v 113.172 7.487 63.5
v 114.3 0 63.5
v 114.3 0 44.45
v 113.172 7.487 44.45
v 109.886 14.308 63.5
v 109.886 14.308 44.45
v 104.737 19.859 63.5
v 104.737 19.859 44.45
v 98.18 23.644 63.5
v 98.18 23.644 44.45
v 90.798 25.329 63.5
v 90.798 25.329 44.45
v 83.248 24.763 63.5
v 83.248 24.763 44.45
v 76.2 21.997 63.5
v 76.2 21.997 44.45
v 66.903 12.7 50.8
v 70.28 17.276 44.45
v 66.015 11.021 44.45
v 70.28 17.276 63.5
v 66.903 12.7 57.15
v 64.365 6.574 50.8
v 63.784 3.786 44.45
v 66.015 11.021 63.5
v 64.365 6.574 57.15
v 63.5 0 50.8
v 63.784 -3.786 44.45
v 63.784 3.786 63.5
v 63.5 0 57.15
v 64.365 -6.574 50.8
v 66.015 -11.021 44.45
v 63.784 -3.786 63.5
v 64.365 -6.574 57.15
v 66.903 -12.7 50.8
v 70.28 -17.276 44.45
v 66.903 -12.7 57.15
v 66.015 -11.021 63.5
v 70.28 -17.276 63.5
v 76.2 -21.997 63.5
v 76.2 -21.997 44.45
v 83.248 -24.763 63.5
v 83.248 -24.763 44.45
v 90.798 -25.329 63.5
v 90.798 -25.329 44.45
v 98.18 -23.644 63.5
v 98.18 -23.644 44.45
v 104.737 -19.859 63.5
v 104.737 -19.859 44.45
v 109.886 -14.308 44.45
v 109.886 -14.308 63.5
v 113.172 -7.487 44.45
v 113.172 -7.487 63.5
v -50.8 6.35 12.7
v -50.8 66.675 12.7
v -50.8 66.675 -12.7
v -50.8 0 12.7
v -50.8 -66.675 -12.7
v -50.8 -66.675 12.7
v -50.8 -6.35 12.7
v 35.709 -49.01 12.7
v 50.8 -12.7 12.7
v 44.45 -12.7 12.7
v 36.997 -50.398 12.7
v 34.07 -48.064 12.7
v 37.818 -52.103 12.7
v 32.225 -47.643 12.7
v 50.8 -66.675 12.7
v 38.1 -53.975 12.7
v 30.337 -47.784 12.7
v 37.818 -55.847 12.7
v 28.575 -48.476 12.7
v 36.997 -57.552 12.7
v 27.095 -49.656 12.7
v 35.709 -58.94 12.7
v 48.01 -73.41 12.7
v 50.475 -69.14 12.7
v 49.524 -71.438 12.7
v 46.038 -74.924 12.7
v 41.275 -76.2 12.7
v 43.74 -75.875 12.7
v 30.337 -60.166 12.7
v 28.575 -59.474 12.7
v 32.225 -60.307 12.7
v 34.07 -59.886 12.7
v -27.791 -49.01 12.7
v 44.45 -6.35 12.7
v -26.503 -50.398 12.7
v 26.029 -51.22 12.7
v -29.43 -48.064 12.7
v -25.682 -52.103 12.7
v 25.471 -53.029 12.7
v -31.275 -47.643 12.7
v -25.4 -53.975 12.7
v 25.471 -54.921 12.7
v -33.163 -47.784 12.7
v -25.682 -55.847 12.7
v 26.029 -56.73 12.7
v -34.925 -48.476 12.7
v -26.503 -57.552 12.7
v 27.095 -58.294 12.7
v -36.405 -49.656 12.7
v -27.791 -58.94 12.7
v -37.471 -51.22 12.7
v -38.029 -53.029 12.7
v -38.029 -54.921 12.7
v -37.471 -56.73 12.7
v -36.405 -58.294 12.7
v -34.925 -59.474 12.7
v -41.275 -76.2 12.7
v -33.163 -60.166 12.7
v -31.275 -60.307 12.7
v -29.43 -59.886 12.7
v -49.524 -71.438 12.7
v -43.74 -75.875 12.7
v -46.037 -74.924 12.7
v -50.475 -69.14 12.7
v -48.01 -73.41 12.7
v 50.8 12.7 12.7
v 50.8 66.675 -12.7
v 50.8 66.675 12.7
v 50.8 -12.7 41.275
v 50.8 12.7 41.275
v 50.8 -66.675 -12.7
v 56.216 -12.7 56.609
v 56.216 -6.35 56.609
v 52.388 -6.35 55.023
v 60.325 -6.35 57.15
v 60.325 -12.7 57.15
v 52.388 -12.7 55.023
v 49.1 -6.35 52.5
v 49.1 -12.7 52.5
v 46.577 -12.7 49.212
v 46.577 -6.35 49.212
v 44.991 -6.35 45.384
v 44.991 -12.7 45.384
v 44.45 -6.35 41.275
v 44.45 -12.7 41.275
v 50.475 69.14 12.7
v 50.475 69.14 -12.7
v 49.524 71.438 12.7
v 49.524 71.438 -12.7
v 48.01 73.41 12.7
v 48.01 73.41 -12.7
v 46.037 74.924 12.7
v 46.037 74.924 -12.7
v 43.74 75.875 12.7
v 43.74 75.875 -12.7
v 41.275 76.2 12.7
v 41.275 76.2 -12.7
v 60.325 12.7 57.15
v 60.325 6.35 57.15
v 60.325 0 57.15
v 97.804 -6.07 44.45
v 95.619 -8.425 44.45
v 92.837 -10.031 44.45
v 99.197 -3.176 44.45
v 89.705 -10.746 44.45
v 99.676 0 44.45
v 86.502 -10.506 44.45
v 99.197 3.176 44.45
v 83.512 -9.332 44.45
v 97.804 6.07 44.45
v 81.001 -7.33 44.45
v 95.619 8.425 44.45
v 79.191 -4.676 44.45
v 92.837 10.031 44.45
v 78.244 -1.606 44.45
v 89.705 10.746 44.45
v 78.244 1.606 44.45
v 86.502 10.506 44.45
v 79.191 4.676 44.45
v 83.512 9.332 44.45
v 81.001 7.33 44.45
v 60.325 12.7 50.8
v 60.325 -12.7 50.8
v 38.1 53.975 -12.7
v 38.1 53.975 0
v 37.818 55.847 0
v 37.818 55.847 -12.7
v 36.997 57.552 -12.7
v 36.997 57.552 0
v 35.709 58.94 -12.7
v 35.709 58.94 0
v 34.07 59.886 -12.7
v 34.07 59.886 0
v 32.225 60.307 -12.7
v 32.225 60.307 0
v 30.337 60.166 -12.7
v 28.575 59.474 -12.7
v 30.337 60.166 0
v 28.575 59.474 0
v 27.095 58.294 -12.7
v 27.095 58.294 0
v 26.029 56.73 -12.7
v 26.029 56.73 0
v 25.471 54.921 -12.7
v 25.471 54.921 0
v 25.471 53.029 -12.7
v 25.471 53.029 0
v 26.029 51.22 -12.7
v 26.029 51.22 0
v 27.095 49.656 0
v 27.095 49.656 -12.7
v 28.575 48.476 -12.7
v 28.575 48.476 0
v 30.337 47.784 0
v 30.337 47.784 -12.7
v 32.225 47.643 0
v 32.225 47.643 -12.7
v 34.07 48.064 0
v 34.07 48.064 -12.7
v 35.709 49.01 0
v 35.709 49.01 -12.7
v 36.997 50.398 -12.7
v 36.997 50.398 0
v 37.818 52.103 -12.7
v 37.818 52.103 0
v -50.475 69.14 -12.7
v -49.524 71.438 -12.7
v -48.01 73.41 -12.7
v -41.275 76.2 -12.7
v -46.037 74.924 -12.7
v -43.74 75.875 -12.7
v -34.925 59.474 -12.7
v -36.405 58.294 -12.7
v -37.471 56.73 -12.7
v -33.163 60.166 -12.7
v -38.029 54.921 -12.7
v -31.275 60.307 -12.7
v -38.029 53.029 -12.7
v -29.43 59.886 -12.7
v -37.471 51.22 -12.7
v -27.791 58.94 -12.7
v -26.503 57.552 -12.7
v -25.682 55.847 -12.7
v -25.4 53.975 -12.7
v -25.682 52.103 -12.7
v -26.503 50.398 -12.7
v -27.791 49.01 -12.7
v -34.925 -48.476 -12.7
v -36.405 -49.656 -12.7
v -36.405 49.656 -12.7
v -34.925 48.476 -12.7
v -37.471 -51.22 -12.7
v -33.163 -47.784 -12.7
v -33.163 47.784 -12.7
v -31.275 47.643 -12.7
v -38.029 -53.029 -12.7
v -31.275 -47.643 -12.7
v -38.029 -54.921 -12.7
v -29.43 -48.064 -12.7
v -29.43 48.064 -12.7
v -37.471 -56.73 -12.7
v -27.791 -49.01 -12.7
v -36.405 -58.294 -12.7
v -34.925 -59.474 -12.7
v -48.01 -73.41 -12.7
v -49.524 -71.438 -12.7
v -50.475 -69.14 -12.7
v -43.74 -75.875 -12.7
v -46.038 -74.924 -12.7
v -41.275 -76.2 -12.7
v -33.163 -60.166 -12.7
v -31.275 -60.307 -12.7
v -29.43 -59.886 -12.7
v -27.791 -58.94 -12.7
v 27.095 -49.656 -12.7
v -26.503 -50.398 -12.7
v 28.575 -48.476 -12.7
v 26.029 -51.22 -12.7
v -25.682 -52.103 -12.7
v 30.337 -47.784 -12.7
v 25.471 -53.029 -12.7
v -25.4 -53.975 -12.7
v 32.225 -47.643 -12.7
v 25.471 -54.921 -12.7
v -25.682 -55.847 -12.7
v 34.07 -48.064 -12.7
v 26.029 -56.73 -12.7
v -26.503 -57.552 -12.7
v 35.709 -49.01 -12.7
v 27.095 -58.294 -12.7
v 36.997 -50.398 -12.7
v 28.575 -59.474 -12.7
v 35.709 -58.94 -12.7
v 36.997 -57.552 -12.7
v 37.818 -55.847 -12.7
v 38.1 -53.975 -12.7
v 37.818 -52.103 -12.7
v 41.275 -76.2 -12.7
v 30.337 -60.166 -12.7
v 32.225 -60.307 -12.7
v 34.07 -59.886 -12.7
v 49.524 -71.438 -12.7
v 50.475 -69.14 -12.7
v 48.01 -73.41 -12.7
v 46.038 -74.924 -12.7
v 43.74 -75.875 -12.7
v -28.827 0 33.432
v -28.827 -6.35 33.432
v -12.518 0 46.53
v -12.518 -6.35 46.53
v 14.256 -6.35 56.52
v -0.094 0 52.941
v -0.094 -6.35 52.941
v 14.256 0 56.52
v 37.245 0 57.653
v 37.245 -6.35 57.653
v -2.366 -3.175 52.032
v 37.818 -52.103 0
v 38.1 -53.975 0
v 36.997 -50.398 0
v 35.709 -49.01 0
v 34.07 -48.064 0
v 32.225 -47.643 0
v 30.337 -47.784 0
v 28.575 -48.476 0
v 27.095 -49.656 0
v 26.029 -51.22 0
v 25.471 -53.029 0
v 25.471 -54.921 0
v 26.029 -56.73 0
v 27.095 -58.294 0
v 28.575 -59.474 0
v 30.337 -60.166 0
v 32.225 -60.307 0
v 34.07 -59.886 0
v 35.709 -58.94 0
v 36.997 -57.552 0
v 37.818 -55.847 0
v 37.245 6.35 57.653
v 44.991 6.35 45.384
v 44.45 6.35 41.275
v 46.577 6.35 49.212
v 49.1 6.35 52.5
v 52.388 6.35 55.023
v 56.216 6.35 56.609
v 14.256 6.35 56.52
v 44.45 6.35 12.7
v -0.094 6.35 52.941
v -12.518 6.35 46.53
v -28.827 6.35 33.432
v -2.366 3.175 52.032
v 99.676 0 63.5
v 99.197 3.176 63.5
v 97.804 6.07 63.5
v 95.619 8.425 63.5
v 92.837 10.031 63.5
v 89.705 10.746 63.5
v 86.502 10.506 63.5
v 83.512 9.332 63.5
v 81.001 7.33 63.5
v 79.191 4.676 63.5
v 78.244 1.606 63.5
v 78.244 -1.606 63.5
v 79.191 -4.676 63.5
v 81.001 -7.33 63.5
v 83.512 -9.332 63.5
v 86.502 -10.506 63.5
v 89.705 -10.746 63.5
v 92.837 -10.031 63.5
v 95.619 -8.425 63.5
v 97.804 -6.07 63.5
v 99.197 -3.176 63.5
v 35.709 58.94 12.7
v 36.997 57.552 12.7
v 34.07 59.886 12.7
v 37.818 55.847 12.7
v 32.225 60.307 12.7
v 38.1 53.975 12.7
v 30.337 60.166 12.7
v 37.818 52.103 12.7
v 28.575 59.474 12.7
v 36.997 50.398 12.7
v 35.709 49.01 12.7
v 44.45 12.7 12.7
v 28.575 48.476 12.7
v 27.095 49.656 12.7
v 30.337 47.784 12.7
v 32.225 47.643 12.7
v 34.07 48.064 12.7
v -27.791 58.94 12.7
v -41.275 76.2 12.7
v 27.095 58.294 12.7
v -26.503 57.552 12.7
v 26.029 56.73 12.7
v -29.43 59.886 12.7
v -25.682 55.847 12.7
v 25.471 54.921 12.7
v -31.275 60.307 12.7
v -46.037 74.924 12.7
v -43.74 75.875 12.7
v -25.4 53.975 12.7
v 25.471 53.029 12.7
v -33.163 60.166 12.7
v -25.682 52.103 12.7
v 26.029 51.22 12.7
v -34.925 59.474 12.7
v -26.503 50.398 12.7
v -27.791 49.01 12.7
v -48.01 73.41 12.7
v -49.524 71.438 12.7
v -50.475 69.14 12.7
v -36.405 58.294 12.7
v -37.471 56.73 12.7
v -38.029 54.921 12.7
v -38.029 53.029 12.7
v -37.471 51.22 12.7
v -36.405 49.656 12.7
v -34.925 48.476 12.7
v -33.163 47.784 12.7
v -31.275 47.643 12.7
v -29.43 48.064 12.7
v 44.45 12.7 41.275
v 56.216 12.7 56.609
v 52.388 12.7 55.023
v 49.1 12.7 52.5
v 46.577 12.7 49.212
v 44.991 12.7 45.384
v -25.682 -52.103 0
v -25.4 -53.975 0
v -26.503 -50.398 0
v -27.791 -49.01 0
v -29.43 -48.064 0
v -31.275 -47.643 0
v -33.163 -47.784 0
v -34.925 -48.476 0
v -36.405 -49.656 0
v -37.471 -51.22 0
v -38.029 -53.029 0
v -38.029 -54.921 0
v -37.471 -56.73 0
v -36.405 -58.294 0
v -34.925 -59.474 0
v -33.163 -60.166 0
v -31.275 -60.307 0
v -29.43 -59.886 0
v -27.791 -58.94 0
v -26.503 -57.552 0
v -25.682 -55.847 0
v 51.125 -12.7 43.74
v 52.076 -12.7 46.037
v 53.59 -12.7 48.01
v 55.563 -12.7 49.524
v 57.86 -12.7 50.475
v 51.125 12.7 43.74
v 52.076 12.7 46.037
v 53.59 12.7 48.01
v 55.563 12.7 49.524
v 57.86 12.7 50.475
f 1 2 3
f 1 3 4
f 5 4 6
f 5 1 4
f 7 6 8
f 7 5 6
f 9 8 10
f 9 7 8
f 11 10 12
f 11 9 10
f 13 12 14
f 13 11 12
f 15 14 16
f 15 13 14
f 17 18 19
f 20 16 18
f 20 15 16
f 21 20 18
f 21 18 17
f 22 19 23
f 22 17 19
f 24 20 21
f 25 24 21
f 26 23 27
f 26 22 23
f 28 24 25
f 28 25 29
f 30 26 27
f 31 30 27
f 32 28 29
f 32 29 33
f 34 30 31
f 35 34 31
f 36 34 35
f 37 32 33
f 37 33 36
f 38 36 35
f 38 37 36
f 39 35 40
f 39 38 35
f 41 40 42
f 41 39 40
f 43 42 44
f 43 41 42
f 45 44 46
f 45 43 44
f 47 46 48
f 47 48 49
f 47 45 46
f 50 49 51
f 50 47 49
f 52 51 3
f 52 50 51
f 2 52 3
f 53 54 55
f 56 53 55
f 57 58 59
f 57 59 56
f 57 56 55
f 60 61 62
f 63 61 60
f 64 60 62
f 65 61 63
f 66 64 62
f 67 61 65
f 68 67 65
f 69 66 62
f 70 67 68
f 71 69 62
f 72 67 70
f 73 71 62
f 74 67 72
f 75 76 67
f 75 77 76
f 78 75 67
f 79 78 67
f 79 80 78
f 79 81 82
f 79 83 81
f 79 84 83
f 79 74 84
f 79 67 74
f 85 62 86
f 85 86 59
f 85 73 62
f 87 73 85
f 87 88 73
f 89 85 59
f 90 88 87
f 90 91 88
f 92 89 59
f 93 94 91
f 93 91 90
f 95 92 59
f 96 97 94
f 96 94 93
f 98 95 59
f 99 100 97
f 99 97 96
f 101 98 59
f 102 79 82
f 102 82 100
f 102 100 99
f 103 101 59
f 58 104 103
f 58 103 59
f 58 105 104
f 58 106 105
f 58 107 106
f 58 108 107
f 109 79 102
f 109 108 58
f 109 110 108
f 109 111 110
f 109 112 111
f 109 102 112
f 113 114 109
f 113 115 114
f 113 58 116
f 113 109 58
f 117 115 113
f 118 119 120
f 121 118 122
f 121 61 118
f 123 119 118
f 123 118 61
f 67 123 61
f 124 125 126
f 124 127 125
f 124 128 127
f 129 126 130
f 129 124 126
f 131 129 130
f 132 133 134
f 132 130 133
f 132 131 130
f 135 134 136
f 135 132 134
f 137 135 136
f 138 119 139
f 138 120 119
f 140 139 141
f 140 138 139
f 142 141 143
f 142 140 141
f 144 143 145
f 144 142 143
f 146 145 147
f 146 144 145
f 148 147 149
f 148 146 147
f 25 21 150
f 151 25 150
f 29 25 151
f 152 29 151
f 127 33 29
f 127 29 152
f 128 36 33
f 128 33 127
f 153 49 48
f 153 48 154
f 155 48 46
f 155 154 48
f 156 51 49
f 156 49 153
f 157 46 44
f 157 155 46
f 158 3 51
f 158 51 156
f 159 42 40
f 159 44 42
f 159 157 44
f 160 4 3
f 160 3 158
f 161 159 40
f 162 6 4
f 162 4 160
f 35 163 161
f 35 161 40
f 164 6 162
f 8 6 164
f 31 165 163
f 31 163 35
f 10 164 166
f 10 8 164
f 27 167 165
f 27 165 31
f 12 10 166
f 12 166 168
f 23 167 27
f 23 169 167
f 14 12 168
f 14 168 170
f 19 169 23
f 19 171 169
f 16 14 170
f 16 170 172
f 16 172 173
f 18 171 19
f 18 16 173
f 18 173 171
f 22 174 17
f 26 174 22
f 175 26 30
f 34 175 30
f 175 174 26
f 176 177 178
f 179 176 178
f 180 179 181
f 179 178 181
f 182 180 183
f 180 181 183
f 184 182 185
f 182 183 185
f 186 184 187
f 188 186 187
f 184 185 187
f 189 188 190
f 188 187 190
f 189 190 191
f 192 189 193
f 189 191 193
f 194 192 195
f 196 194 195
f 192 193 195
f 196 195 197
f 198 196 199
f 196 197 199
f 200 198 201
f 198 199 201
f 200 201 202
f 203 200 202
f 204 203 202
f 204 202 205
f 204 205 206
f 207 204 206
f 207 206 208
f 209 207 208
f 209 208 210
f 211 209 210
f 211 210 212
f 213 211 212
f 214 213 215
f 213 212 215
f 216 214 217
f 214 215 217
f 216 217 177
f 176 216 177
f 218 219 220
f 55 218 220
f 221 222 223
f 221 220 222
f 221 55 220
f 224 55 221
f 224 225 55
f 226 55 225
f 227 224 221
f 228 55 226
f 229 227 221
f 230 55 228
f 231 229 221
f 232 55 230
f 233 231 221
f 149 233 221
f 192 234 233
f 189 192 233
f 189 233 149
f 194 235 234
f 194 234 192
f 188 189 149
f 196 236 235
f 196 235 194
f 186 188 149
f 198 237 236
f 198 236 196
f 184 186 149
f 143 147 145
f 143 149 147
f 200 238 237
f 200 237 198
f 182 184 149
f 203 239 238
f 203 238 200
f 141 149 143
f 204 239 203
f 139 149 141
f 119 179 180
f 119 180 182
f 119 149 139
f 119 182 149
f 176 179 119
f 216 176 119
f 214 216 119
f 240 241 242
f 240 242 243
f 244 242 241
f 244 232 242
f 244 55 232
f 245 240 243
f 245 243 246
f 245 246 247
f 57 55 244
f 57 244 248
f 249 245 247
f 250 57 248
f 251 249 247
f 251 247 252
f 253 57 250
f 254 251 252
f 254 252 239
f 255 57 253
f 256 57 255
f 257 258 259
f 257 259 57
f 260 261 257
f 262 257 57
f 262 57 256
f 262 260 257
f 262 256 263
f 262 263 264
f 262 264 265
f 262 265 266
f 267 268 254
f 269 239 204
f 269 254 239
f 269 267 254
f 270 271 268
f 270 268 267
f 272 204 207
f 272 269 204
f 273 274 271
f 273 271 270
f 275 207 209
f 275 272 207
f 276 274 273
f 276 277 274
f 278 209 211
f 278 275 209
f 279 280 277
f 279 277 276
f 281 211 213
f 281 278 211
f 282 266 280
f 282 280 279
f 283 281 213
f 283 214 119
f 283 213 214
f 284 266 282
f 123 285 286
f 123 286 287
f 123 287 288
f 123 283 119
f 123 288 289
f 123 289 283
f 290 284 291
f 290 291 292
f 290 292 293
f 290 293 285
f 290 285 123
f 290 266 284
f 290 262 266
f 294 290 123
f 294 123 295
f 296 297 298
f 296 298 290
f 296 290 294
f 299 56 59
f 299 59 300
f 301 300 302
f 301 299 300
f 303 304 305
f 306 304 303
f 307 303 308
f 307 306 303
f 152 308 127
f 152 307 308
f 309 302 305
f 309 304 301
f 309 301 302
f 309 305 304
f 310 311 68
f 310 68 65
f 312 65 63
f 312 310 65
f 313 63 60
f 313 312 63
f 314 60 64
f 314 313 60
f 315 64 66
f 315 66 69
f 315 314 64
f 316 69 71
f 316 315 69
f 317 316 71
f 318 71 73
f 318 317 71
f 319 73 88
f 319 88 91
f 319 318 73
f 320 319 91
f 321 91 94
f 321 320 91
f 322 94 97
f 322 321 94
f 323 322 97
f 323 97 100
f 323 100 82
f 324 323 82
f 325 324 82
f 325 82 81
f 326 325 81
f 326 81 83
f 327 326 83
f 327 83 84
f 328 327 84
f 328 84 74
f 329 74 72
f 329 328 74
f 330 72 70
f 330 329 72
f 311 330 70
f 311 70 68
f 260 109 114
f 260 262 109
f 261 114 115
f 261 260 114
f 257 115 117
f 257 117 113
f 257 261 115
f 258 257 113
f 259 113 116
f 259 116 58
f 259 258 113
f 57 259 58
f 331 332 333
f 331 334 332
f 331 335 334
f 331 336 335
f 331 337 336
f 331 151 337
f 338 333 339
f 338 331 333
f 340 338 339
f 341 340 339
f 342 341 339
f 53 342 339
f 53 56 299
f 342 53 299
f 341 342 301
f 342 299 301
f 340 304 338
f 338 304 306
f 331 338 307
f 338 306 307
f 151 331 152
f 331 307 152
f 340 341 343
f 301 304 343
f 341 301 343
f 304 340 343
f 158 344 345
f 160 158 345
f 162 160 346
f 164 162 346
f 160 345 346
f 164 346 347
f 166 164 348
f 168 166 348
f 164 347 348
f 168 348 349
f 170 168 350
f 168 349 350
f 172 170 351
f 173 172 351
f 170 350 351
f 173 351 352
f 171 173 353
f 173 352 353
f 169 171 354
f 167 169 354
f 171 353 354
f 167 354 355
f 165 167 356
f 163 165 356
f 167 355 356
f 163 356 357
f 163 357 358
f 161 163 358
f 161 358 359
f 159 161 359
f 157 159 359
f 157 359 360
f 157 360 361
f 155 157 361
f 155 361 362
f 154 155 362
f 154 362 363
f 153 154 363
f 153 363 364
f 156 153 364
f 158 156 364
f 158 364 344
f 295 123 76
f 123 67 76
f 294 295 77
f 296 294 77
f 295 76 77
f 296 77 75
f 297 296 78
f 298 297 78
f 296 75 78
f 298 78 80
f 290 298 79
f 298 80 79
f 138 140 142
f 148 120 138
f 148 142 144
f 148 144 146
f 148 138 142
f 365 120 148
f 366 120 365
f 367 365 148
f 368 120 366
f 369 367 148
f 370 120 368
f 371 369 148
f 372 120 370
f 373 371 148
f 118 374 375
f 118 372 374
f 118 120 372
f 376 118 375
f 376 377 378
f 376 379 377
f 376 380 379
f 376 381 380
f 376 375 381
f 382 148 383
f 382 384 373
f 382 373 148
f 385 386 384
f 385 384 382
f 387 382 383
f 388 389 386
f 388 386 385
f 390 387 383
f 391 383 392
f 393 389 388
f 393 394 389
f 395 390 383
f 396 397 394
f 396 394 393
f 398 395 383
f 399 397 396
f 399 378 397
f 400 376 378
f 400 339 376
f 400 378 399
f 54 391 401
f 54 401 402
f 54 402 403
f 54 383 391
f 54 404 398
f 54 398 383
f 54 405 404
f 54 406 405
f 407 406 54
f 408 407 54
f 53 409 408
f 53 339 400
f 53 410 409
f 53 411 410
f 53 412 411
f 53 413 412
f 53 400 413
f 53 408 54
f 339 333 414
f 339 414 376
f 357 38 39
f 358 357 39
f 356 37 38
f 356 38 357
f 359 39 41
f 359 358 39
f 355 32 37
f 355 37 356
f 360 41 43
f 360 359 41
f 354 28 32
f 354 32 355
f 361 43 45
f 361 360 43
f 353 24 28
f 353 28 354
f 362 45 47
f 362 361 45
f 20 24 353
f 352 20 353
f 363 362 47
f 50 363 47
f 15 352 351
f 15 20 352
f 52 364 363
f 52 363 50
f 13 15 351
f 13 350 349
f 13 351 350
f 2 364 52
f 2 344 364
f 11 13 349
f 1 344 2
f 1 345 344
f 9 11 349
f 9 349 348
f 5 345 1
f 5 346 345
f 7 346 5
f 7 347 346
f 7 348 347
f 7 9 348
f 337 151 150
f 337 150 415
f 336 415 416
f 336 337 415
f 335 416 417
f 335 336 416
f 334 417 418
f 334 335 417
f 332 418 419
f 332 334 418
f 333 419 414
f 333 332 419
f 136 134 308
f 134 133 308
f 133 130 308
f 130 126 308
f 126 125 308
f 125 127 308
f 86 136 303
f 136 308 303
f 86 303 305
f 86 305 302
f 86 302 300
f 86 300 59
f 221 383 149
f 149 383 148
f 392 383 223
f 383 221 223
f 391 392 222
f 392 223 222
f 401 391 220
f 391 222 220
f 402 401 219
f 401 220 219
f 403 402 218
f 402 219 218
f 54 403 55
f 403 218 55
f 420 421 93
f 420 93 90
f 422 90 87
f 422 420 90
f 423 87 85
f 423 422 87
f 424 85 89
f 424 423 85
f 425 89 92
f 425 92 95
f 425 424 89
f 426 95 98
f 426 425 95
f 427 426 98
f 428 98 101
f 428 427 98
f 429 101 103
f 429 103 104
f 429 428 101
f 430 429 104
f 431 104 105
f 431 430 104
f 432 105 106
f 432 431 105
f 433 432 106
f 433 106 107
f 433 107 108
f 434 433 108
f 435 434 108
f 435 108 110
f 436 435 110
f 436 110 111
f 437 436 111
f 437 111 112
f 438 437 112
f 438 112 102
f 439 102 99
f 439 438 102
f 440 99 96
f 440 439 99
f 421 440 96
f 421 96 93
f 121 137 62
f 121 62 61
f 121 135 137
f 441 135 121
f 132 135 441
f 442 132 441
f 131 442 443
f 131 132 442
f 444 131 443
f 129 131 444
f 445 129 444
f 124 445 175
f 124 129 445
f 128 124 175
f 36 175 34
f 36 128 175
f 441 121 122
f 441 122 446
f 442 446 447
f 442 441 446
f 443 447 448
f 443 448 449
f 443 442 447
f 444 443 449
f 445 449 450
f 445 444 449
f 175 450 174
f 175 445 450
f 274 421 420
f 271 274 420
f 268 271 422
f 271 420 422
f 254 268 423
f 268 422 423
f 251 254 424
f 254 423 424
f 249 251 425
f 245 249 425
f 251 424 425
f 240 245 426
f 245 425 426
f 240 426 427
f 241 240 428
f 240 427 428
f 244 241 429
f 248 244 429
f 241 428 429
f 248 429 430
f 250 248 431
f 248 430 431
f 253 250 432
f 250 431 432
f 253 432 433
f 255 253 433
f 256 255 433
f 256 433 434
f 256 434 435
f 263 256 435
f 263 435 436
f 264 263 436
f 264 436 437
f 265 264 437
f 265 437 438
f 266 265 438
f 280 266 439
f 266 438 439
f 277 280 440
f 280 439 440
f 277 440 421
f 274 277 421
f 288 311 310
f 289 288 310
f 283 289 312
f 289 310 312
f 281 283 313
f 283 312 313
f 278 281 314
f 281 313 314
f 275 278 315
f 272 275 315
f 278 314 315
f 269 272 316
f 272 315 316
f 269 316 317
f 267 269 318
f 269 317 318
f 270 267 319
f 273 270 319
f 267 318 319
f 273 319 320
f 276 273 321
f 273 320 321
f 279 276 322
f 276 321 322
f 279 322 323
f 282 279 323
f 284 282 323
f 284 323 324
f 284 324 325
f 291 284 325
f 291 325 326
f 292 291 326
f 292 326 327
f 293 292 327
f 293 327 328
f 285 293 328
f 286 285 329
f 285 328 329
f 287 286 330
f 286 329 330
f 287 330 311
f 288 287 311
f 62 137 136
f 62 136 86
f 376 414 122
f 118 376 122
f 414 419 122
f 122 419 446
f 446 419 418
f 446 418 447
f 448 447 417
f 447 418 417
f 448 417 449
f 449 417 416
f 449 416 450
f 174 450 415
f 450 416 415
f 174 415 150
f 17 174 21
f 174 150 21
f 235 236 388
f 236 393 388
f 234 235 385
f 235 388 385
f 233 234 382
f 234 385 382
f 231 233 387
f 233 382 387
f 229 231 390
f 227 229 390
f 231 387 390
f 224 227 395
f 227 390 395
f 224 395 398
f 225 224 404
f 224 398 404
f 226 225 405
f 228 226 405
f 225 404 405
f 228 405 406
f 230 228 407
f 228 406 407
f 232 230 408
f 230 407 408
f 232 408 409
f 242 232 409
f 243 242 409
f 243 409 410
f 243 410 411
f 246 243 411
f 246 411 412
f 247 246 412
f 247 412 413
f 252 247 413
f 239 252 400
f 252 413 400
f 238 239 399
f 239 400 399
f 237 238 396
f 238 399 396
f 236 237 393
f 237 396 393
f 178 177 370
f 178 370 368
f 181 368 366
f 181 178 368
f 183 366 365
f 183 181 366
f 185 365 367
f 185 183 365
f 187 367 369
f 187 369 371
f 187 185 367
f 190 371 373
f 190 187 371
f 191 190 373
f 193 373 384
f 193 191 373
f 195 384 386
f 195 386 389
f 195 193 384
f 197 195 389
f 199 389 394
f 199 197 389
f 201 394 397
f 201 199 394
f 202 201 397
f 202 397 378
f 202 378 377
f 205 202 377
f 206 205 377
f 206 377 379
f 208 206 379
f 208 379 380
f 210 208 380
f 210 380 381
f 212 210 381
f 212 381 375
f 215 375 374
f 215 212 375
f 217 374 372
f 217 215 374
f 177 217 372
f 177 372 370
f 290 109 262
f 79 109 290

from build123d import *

# Parameters (mm, degrees)
F1_DEPTH = 76.2
F2_DEPTH = 12.7
F3_DEPTH = 6.35
F5_R     = 9.525
F6_R     = 10.7761659596
F7_DEPTH = 76.201
F8_R     = 6.35
F9_DEPTH = 12.7


with BuildPart() as f1:
    # F0 (on Front) → F1 (new body, symmetric)
    with BuildSketch(Plane.XZ):
        Polygon((-50.8, 12.7), (-50.8, -12.7), (50.8, -12.7), (50.8, 12.7), (44.45, 12.7), align=None)
    extrude(amount=F1_DEPTH, both=True)

    # F0 (on Front) → F2 (join, symmetric)
    with BuildSketch(Plane.XZ):
        with BuildLine():
            Line((44.45, 12.7), (50.8, 12.7))
            Line((50.8, 12.7), (50.8, 41.275))
            ThreePointArc((50.8, 41.275), (53.5898079092, 48.0101920908), (60.325, 50.8))
            Line((60.325, 50.8), (88.9, 50.8))
            Line((88.9, 50.8), (88.9, 57.15))
            Line((88.9, 57.15), (60.325, 57.15))
            ThreePointArc((60.325, 57.15), (49.0996798487, 52.5003201513), (44.45, 41.275))
            Line((44.45, 41.275), (44.45, 12.7))
        make_face()
    extrude(amount=F2_DEPTH, both=True)

    # F0 (on Front) → F3 (join, symmetric)
    with BuildSketch(Plane.XZ):
        with BuildLine():
            add(Edge.make_bspline(
                [(-50.8, 12.7), (-36.4359264535, 24.9142696717), (-6.0956798741, 63.0964294524), (39.4712934893, 57.15), (60.325, 57.15)],
                knots=[0, 0, 0, 0, 0.4989893673, 1, 1, 1, 1], degree=3))
            Line((-50.8, 12.7), (44.45, 12.7))
            Line((44.45, 12.7), (44.45, 41.275))
            ThreePointArc((44.45, 41.275), (49.0996798487, 52.5003201513), (60.325, 57.15))
        make_face()
    extrude(amount=F3_DEPTH, both=True)

    # F0 (on Front) → F4 (revolve)
    with BuildSketch(Plane.XZ):
        Polygon((88.9, 63.5), (88.9, 57.15), (88.9, 50.8), (88.9, 44.45), (114.3, 44.45), (114.3, 63.5), align=None)
    revolve(axis=Axis((88.9, 0, 53.975), (0, 0, 1)))

    # F5
    f5_edges = [f1.edges().sort_by_distance(p)[0] for p in [
        (50.8, -76.2, 0),
        (50.8, 76.2, 0),
        (-50.8, 76.2, 0),
        (-50.8, -76.2, 0),
    ]]
    fillet(f5_edges, radius=F5_R)

    # F6 (on face) → F7 (cut, through all)
    with BuildSketch(Plane.XY.offset(63.5)):
        with Locations((88.9, 0)):
            Circle(F6_R)
    extrude(amount=-F7_DEPTH, mode=Mode.SUBTRACT)

    # F8 (on Top) → F9 (cut, symmetric)
    with BuildSketch(Plane.XY):
        with Locations((-31.75, -53.975)):
            Circle(F8_R)
        with Locations((31.75, -53.975)):
            Circle(F8_R)
        with Locations((31.75, 53.975)):
            Circle(F8_R)
        with Locations((-31.75, 53.975)):
            Circle(F8_R)
    extrude(amount=F9_DEPTH, both=True, mode=Mode.SUBTRACT)


solid = f1.part
